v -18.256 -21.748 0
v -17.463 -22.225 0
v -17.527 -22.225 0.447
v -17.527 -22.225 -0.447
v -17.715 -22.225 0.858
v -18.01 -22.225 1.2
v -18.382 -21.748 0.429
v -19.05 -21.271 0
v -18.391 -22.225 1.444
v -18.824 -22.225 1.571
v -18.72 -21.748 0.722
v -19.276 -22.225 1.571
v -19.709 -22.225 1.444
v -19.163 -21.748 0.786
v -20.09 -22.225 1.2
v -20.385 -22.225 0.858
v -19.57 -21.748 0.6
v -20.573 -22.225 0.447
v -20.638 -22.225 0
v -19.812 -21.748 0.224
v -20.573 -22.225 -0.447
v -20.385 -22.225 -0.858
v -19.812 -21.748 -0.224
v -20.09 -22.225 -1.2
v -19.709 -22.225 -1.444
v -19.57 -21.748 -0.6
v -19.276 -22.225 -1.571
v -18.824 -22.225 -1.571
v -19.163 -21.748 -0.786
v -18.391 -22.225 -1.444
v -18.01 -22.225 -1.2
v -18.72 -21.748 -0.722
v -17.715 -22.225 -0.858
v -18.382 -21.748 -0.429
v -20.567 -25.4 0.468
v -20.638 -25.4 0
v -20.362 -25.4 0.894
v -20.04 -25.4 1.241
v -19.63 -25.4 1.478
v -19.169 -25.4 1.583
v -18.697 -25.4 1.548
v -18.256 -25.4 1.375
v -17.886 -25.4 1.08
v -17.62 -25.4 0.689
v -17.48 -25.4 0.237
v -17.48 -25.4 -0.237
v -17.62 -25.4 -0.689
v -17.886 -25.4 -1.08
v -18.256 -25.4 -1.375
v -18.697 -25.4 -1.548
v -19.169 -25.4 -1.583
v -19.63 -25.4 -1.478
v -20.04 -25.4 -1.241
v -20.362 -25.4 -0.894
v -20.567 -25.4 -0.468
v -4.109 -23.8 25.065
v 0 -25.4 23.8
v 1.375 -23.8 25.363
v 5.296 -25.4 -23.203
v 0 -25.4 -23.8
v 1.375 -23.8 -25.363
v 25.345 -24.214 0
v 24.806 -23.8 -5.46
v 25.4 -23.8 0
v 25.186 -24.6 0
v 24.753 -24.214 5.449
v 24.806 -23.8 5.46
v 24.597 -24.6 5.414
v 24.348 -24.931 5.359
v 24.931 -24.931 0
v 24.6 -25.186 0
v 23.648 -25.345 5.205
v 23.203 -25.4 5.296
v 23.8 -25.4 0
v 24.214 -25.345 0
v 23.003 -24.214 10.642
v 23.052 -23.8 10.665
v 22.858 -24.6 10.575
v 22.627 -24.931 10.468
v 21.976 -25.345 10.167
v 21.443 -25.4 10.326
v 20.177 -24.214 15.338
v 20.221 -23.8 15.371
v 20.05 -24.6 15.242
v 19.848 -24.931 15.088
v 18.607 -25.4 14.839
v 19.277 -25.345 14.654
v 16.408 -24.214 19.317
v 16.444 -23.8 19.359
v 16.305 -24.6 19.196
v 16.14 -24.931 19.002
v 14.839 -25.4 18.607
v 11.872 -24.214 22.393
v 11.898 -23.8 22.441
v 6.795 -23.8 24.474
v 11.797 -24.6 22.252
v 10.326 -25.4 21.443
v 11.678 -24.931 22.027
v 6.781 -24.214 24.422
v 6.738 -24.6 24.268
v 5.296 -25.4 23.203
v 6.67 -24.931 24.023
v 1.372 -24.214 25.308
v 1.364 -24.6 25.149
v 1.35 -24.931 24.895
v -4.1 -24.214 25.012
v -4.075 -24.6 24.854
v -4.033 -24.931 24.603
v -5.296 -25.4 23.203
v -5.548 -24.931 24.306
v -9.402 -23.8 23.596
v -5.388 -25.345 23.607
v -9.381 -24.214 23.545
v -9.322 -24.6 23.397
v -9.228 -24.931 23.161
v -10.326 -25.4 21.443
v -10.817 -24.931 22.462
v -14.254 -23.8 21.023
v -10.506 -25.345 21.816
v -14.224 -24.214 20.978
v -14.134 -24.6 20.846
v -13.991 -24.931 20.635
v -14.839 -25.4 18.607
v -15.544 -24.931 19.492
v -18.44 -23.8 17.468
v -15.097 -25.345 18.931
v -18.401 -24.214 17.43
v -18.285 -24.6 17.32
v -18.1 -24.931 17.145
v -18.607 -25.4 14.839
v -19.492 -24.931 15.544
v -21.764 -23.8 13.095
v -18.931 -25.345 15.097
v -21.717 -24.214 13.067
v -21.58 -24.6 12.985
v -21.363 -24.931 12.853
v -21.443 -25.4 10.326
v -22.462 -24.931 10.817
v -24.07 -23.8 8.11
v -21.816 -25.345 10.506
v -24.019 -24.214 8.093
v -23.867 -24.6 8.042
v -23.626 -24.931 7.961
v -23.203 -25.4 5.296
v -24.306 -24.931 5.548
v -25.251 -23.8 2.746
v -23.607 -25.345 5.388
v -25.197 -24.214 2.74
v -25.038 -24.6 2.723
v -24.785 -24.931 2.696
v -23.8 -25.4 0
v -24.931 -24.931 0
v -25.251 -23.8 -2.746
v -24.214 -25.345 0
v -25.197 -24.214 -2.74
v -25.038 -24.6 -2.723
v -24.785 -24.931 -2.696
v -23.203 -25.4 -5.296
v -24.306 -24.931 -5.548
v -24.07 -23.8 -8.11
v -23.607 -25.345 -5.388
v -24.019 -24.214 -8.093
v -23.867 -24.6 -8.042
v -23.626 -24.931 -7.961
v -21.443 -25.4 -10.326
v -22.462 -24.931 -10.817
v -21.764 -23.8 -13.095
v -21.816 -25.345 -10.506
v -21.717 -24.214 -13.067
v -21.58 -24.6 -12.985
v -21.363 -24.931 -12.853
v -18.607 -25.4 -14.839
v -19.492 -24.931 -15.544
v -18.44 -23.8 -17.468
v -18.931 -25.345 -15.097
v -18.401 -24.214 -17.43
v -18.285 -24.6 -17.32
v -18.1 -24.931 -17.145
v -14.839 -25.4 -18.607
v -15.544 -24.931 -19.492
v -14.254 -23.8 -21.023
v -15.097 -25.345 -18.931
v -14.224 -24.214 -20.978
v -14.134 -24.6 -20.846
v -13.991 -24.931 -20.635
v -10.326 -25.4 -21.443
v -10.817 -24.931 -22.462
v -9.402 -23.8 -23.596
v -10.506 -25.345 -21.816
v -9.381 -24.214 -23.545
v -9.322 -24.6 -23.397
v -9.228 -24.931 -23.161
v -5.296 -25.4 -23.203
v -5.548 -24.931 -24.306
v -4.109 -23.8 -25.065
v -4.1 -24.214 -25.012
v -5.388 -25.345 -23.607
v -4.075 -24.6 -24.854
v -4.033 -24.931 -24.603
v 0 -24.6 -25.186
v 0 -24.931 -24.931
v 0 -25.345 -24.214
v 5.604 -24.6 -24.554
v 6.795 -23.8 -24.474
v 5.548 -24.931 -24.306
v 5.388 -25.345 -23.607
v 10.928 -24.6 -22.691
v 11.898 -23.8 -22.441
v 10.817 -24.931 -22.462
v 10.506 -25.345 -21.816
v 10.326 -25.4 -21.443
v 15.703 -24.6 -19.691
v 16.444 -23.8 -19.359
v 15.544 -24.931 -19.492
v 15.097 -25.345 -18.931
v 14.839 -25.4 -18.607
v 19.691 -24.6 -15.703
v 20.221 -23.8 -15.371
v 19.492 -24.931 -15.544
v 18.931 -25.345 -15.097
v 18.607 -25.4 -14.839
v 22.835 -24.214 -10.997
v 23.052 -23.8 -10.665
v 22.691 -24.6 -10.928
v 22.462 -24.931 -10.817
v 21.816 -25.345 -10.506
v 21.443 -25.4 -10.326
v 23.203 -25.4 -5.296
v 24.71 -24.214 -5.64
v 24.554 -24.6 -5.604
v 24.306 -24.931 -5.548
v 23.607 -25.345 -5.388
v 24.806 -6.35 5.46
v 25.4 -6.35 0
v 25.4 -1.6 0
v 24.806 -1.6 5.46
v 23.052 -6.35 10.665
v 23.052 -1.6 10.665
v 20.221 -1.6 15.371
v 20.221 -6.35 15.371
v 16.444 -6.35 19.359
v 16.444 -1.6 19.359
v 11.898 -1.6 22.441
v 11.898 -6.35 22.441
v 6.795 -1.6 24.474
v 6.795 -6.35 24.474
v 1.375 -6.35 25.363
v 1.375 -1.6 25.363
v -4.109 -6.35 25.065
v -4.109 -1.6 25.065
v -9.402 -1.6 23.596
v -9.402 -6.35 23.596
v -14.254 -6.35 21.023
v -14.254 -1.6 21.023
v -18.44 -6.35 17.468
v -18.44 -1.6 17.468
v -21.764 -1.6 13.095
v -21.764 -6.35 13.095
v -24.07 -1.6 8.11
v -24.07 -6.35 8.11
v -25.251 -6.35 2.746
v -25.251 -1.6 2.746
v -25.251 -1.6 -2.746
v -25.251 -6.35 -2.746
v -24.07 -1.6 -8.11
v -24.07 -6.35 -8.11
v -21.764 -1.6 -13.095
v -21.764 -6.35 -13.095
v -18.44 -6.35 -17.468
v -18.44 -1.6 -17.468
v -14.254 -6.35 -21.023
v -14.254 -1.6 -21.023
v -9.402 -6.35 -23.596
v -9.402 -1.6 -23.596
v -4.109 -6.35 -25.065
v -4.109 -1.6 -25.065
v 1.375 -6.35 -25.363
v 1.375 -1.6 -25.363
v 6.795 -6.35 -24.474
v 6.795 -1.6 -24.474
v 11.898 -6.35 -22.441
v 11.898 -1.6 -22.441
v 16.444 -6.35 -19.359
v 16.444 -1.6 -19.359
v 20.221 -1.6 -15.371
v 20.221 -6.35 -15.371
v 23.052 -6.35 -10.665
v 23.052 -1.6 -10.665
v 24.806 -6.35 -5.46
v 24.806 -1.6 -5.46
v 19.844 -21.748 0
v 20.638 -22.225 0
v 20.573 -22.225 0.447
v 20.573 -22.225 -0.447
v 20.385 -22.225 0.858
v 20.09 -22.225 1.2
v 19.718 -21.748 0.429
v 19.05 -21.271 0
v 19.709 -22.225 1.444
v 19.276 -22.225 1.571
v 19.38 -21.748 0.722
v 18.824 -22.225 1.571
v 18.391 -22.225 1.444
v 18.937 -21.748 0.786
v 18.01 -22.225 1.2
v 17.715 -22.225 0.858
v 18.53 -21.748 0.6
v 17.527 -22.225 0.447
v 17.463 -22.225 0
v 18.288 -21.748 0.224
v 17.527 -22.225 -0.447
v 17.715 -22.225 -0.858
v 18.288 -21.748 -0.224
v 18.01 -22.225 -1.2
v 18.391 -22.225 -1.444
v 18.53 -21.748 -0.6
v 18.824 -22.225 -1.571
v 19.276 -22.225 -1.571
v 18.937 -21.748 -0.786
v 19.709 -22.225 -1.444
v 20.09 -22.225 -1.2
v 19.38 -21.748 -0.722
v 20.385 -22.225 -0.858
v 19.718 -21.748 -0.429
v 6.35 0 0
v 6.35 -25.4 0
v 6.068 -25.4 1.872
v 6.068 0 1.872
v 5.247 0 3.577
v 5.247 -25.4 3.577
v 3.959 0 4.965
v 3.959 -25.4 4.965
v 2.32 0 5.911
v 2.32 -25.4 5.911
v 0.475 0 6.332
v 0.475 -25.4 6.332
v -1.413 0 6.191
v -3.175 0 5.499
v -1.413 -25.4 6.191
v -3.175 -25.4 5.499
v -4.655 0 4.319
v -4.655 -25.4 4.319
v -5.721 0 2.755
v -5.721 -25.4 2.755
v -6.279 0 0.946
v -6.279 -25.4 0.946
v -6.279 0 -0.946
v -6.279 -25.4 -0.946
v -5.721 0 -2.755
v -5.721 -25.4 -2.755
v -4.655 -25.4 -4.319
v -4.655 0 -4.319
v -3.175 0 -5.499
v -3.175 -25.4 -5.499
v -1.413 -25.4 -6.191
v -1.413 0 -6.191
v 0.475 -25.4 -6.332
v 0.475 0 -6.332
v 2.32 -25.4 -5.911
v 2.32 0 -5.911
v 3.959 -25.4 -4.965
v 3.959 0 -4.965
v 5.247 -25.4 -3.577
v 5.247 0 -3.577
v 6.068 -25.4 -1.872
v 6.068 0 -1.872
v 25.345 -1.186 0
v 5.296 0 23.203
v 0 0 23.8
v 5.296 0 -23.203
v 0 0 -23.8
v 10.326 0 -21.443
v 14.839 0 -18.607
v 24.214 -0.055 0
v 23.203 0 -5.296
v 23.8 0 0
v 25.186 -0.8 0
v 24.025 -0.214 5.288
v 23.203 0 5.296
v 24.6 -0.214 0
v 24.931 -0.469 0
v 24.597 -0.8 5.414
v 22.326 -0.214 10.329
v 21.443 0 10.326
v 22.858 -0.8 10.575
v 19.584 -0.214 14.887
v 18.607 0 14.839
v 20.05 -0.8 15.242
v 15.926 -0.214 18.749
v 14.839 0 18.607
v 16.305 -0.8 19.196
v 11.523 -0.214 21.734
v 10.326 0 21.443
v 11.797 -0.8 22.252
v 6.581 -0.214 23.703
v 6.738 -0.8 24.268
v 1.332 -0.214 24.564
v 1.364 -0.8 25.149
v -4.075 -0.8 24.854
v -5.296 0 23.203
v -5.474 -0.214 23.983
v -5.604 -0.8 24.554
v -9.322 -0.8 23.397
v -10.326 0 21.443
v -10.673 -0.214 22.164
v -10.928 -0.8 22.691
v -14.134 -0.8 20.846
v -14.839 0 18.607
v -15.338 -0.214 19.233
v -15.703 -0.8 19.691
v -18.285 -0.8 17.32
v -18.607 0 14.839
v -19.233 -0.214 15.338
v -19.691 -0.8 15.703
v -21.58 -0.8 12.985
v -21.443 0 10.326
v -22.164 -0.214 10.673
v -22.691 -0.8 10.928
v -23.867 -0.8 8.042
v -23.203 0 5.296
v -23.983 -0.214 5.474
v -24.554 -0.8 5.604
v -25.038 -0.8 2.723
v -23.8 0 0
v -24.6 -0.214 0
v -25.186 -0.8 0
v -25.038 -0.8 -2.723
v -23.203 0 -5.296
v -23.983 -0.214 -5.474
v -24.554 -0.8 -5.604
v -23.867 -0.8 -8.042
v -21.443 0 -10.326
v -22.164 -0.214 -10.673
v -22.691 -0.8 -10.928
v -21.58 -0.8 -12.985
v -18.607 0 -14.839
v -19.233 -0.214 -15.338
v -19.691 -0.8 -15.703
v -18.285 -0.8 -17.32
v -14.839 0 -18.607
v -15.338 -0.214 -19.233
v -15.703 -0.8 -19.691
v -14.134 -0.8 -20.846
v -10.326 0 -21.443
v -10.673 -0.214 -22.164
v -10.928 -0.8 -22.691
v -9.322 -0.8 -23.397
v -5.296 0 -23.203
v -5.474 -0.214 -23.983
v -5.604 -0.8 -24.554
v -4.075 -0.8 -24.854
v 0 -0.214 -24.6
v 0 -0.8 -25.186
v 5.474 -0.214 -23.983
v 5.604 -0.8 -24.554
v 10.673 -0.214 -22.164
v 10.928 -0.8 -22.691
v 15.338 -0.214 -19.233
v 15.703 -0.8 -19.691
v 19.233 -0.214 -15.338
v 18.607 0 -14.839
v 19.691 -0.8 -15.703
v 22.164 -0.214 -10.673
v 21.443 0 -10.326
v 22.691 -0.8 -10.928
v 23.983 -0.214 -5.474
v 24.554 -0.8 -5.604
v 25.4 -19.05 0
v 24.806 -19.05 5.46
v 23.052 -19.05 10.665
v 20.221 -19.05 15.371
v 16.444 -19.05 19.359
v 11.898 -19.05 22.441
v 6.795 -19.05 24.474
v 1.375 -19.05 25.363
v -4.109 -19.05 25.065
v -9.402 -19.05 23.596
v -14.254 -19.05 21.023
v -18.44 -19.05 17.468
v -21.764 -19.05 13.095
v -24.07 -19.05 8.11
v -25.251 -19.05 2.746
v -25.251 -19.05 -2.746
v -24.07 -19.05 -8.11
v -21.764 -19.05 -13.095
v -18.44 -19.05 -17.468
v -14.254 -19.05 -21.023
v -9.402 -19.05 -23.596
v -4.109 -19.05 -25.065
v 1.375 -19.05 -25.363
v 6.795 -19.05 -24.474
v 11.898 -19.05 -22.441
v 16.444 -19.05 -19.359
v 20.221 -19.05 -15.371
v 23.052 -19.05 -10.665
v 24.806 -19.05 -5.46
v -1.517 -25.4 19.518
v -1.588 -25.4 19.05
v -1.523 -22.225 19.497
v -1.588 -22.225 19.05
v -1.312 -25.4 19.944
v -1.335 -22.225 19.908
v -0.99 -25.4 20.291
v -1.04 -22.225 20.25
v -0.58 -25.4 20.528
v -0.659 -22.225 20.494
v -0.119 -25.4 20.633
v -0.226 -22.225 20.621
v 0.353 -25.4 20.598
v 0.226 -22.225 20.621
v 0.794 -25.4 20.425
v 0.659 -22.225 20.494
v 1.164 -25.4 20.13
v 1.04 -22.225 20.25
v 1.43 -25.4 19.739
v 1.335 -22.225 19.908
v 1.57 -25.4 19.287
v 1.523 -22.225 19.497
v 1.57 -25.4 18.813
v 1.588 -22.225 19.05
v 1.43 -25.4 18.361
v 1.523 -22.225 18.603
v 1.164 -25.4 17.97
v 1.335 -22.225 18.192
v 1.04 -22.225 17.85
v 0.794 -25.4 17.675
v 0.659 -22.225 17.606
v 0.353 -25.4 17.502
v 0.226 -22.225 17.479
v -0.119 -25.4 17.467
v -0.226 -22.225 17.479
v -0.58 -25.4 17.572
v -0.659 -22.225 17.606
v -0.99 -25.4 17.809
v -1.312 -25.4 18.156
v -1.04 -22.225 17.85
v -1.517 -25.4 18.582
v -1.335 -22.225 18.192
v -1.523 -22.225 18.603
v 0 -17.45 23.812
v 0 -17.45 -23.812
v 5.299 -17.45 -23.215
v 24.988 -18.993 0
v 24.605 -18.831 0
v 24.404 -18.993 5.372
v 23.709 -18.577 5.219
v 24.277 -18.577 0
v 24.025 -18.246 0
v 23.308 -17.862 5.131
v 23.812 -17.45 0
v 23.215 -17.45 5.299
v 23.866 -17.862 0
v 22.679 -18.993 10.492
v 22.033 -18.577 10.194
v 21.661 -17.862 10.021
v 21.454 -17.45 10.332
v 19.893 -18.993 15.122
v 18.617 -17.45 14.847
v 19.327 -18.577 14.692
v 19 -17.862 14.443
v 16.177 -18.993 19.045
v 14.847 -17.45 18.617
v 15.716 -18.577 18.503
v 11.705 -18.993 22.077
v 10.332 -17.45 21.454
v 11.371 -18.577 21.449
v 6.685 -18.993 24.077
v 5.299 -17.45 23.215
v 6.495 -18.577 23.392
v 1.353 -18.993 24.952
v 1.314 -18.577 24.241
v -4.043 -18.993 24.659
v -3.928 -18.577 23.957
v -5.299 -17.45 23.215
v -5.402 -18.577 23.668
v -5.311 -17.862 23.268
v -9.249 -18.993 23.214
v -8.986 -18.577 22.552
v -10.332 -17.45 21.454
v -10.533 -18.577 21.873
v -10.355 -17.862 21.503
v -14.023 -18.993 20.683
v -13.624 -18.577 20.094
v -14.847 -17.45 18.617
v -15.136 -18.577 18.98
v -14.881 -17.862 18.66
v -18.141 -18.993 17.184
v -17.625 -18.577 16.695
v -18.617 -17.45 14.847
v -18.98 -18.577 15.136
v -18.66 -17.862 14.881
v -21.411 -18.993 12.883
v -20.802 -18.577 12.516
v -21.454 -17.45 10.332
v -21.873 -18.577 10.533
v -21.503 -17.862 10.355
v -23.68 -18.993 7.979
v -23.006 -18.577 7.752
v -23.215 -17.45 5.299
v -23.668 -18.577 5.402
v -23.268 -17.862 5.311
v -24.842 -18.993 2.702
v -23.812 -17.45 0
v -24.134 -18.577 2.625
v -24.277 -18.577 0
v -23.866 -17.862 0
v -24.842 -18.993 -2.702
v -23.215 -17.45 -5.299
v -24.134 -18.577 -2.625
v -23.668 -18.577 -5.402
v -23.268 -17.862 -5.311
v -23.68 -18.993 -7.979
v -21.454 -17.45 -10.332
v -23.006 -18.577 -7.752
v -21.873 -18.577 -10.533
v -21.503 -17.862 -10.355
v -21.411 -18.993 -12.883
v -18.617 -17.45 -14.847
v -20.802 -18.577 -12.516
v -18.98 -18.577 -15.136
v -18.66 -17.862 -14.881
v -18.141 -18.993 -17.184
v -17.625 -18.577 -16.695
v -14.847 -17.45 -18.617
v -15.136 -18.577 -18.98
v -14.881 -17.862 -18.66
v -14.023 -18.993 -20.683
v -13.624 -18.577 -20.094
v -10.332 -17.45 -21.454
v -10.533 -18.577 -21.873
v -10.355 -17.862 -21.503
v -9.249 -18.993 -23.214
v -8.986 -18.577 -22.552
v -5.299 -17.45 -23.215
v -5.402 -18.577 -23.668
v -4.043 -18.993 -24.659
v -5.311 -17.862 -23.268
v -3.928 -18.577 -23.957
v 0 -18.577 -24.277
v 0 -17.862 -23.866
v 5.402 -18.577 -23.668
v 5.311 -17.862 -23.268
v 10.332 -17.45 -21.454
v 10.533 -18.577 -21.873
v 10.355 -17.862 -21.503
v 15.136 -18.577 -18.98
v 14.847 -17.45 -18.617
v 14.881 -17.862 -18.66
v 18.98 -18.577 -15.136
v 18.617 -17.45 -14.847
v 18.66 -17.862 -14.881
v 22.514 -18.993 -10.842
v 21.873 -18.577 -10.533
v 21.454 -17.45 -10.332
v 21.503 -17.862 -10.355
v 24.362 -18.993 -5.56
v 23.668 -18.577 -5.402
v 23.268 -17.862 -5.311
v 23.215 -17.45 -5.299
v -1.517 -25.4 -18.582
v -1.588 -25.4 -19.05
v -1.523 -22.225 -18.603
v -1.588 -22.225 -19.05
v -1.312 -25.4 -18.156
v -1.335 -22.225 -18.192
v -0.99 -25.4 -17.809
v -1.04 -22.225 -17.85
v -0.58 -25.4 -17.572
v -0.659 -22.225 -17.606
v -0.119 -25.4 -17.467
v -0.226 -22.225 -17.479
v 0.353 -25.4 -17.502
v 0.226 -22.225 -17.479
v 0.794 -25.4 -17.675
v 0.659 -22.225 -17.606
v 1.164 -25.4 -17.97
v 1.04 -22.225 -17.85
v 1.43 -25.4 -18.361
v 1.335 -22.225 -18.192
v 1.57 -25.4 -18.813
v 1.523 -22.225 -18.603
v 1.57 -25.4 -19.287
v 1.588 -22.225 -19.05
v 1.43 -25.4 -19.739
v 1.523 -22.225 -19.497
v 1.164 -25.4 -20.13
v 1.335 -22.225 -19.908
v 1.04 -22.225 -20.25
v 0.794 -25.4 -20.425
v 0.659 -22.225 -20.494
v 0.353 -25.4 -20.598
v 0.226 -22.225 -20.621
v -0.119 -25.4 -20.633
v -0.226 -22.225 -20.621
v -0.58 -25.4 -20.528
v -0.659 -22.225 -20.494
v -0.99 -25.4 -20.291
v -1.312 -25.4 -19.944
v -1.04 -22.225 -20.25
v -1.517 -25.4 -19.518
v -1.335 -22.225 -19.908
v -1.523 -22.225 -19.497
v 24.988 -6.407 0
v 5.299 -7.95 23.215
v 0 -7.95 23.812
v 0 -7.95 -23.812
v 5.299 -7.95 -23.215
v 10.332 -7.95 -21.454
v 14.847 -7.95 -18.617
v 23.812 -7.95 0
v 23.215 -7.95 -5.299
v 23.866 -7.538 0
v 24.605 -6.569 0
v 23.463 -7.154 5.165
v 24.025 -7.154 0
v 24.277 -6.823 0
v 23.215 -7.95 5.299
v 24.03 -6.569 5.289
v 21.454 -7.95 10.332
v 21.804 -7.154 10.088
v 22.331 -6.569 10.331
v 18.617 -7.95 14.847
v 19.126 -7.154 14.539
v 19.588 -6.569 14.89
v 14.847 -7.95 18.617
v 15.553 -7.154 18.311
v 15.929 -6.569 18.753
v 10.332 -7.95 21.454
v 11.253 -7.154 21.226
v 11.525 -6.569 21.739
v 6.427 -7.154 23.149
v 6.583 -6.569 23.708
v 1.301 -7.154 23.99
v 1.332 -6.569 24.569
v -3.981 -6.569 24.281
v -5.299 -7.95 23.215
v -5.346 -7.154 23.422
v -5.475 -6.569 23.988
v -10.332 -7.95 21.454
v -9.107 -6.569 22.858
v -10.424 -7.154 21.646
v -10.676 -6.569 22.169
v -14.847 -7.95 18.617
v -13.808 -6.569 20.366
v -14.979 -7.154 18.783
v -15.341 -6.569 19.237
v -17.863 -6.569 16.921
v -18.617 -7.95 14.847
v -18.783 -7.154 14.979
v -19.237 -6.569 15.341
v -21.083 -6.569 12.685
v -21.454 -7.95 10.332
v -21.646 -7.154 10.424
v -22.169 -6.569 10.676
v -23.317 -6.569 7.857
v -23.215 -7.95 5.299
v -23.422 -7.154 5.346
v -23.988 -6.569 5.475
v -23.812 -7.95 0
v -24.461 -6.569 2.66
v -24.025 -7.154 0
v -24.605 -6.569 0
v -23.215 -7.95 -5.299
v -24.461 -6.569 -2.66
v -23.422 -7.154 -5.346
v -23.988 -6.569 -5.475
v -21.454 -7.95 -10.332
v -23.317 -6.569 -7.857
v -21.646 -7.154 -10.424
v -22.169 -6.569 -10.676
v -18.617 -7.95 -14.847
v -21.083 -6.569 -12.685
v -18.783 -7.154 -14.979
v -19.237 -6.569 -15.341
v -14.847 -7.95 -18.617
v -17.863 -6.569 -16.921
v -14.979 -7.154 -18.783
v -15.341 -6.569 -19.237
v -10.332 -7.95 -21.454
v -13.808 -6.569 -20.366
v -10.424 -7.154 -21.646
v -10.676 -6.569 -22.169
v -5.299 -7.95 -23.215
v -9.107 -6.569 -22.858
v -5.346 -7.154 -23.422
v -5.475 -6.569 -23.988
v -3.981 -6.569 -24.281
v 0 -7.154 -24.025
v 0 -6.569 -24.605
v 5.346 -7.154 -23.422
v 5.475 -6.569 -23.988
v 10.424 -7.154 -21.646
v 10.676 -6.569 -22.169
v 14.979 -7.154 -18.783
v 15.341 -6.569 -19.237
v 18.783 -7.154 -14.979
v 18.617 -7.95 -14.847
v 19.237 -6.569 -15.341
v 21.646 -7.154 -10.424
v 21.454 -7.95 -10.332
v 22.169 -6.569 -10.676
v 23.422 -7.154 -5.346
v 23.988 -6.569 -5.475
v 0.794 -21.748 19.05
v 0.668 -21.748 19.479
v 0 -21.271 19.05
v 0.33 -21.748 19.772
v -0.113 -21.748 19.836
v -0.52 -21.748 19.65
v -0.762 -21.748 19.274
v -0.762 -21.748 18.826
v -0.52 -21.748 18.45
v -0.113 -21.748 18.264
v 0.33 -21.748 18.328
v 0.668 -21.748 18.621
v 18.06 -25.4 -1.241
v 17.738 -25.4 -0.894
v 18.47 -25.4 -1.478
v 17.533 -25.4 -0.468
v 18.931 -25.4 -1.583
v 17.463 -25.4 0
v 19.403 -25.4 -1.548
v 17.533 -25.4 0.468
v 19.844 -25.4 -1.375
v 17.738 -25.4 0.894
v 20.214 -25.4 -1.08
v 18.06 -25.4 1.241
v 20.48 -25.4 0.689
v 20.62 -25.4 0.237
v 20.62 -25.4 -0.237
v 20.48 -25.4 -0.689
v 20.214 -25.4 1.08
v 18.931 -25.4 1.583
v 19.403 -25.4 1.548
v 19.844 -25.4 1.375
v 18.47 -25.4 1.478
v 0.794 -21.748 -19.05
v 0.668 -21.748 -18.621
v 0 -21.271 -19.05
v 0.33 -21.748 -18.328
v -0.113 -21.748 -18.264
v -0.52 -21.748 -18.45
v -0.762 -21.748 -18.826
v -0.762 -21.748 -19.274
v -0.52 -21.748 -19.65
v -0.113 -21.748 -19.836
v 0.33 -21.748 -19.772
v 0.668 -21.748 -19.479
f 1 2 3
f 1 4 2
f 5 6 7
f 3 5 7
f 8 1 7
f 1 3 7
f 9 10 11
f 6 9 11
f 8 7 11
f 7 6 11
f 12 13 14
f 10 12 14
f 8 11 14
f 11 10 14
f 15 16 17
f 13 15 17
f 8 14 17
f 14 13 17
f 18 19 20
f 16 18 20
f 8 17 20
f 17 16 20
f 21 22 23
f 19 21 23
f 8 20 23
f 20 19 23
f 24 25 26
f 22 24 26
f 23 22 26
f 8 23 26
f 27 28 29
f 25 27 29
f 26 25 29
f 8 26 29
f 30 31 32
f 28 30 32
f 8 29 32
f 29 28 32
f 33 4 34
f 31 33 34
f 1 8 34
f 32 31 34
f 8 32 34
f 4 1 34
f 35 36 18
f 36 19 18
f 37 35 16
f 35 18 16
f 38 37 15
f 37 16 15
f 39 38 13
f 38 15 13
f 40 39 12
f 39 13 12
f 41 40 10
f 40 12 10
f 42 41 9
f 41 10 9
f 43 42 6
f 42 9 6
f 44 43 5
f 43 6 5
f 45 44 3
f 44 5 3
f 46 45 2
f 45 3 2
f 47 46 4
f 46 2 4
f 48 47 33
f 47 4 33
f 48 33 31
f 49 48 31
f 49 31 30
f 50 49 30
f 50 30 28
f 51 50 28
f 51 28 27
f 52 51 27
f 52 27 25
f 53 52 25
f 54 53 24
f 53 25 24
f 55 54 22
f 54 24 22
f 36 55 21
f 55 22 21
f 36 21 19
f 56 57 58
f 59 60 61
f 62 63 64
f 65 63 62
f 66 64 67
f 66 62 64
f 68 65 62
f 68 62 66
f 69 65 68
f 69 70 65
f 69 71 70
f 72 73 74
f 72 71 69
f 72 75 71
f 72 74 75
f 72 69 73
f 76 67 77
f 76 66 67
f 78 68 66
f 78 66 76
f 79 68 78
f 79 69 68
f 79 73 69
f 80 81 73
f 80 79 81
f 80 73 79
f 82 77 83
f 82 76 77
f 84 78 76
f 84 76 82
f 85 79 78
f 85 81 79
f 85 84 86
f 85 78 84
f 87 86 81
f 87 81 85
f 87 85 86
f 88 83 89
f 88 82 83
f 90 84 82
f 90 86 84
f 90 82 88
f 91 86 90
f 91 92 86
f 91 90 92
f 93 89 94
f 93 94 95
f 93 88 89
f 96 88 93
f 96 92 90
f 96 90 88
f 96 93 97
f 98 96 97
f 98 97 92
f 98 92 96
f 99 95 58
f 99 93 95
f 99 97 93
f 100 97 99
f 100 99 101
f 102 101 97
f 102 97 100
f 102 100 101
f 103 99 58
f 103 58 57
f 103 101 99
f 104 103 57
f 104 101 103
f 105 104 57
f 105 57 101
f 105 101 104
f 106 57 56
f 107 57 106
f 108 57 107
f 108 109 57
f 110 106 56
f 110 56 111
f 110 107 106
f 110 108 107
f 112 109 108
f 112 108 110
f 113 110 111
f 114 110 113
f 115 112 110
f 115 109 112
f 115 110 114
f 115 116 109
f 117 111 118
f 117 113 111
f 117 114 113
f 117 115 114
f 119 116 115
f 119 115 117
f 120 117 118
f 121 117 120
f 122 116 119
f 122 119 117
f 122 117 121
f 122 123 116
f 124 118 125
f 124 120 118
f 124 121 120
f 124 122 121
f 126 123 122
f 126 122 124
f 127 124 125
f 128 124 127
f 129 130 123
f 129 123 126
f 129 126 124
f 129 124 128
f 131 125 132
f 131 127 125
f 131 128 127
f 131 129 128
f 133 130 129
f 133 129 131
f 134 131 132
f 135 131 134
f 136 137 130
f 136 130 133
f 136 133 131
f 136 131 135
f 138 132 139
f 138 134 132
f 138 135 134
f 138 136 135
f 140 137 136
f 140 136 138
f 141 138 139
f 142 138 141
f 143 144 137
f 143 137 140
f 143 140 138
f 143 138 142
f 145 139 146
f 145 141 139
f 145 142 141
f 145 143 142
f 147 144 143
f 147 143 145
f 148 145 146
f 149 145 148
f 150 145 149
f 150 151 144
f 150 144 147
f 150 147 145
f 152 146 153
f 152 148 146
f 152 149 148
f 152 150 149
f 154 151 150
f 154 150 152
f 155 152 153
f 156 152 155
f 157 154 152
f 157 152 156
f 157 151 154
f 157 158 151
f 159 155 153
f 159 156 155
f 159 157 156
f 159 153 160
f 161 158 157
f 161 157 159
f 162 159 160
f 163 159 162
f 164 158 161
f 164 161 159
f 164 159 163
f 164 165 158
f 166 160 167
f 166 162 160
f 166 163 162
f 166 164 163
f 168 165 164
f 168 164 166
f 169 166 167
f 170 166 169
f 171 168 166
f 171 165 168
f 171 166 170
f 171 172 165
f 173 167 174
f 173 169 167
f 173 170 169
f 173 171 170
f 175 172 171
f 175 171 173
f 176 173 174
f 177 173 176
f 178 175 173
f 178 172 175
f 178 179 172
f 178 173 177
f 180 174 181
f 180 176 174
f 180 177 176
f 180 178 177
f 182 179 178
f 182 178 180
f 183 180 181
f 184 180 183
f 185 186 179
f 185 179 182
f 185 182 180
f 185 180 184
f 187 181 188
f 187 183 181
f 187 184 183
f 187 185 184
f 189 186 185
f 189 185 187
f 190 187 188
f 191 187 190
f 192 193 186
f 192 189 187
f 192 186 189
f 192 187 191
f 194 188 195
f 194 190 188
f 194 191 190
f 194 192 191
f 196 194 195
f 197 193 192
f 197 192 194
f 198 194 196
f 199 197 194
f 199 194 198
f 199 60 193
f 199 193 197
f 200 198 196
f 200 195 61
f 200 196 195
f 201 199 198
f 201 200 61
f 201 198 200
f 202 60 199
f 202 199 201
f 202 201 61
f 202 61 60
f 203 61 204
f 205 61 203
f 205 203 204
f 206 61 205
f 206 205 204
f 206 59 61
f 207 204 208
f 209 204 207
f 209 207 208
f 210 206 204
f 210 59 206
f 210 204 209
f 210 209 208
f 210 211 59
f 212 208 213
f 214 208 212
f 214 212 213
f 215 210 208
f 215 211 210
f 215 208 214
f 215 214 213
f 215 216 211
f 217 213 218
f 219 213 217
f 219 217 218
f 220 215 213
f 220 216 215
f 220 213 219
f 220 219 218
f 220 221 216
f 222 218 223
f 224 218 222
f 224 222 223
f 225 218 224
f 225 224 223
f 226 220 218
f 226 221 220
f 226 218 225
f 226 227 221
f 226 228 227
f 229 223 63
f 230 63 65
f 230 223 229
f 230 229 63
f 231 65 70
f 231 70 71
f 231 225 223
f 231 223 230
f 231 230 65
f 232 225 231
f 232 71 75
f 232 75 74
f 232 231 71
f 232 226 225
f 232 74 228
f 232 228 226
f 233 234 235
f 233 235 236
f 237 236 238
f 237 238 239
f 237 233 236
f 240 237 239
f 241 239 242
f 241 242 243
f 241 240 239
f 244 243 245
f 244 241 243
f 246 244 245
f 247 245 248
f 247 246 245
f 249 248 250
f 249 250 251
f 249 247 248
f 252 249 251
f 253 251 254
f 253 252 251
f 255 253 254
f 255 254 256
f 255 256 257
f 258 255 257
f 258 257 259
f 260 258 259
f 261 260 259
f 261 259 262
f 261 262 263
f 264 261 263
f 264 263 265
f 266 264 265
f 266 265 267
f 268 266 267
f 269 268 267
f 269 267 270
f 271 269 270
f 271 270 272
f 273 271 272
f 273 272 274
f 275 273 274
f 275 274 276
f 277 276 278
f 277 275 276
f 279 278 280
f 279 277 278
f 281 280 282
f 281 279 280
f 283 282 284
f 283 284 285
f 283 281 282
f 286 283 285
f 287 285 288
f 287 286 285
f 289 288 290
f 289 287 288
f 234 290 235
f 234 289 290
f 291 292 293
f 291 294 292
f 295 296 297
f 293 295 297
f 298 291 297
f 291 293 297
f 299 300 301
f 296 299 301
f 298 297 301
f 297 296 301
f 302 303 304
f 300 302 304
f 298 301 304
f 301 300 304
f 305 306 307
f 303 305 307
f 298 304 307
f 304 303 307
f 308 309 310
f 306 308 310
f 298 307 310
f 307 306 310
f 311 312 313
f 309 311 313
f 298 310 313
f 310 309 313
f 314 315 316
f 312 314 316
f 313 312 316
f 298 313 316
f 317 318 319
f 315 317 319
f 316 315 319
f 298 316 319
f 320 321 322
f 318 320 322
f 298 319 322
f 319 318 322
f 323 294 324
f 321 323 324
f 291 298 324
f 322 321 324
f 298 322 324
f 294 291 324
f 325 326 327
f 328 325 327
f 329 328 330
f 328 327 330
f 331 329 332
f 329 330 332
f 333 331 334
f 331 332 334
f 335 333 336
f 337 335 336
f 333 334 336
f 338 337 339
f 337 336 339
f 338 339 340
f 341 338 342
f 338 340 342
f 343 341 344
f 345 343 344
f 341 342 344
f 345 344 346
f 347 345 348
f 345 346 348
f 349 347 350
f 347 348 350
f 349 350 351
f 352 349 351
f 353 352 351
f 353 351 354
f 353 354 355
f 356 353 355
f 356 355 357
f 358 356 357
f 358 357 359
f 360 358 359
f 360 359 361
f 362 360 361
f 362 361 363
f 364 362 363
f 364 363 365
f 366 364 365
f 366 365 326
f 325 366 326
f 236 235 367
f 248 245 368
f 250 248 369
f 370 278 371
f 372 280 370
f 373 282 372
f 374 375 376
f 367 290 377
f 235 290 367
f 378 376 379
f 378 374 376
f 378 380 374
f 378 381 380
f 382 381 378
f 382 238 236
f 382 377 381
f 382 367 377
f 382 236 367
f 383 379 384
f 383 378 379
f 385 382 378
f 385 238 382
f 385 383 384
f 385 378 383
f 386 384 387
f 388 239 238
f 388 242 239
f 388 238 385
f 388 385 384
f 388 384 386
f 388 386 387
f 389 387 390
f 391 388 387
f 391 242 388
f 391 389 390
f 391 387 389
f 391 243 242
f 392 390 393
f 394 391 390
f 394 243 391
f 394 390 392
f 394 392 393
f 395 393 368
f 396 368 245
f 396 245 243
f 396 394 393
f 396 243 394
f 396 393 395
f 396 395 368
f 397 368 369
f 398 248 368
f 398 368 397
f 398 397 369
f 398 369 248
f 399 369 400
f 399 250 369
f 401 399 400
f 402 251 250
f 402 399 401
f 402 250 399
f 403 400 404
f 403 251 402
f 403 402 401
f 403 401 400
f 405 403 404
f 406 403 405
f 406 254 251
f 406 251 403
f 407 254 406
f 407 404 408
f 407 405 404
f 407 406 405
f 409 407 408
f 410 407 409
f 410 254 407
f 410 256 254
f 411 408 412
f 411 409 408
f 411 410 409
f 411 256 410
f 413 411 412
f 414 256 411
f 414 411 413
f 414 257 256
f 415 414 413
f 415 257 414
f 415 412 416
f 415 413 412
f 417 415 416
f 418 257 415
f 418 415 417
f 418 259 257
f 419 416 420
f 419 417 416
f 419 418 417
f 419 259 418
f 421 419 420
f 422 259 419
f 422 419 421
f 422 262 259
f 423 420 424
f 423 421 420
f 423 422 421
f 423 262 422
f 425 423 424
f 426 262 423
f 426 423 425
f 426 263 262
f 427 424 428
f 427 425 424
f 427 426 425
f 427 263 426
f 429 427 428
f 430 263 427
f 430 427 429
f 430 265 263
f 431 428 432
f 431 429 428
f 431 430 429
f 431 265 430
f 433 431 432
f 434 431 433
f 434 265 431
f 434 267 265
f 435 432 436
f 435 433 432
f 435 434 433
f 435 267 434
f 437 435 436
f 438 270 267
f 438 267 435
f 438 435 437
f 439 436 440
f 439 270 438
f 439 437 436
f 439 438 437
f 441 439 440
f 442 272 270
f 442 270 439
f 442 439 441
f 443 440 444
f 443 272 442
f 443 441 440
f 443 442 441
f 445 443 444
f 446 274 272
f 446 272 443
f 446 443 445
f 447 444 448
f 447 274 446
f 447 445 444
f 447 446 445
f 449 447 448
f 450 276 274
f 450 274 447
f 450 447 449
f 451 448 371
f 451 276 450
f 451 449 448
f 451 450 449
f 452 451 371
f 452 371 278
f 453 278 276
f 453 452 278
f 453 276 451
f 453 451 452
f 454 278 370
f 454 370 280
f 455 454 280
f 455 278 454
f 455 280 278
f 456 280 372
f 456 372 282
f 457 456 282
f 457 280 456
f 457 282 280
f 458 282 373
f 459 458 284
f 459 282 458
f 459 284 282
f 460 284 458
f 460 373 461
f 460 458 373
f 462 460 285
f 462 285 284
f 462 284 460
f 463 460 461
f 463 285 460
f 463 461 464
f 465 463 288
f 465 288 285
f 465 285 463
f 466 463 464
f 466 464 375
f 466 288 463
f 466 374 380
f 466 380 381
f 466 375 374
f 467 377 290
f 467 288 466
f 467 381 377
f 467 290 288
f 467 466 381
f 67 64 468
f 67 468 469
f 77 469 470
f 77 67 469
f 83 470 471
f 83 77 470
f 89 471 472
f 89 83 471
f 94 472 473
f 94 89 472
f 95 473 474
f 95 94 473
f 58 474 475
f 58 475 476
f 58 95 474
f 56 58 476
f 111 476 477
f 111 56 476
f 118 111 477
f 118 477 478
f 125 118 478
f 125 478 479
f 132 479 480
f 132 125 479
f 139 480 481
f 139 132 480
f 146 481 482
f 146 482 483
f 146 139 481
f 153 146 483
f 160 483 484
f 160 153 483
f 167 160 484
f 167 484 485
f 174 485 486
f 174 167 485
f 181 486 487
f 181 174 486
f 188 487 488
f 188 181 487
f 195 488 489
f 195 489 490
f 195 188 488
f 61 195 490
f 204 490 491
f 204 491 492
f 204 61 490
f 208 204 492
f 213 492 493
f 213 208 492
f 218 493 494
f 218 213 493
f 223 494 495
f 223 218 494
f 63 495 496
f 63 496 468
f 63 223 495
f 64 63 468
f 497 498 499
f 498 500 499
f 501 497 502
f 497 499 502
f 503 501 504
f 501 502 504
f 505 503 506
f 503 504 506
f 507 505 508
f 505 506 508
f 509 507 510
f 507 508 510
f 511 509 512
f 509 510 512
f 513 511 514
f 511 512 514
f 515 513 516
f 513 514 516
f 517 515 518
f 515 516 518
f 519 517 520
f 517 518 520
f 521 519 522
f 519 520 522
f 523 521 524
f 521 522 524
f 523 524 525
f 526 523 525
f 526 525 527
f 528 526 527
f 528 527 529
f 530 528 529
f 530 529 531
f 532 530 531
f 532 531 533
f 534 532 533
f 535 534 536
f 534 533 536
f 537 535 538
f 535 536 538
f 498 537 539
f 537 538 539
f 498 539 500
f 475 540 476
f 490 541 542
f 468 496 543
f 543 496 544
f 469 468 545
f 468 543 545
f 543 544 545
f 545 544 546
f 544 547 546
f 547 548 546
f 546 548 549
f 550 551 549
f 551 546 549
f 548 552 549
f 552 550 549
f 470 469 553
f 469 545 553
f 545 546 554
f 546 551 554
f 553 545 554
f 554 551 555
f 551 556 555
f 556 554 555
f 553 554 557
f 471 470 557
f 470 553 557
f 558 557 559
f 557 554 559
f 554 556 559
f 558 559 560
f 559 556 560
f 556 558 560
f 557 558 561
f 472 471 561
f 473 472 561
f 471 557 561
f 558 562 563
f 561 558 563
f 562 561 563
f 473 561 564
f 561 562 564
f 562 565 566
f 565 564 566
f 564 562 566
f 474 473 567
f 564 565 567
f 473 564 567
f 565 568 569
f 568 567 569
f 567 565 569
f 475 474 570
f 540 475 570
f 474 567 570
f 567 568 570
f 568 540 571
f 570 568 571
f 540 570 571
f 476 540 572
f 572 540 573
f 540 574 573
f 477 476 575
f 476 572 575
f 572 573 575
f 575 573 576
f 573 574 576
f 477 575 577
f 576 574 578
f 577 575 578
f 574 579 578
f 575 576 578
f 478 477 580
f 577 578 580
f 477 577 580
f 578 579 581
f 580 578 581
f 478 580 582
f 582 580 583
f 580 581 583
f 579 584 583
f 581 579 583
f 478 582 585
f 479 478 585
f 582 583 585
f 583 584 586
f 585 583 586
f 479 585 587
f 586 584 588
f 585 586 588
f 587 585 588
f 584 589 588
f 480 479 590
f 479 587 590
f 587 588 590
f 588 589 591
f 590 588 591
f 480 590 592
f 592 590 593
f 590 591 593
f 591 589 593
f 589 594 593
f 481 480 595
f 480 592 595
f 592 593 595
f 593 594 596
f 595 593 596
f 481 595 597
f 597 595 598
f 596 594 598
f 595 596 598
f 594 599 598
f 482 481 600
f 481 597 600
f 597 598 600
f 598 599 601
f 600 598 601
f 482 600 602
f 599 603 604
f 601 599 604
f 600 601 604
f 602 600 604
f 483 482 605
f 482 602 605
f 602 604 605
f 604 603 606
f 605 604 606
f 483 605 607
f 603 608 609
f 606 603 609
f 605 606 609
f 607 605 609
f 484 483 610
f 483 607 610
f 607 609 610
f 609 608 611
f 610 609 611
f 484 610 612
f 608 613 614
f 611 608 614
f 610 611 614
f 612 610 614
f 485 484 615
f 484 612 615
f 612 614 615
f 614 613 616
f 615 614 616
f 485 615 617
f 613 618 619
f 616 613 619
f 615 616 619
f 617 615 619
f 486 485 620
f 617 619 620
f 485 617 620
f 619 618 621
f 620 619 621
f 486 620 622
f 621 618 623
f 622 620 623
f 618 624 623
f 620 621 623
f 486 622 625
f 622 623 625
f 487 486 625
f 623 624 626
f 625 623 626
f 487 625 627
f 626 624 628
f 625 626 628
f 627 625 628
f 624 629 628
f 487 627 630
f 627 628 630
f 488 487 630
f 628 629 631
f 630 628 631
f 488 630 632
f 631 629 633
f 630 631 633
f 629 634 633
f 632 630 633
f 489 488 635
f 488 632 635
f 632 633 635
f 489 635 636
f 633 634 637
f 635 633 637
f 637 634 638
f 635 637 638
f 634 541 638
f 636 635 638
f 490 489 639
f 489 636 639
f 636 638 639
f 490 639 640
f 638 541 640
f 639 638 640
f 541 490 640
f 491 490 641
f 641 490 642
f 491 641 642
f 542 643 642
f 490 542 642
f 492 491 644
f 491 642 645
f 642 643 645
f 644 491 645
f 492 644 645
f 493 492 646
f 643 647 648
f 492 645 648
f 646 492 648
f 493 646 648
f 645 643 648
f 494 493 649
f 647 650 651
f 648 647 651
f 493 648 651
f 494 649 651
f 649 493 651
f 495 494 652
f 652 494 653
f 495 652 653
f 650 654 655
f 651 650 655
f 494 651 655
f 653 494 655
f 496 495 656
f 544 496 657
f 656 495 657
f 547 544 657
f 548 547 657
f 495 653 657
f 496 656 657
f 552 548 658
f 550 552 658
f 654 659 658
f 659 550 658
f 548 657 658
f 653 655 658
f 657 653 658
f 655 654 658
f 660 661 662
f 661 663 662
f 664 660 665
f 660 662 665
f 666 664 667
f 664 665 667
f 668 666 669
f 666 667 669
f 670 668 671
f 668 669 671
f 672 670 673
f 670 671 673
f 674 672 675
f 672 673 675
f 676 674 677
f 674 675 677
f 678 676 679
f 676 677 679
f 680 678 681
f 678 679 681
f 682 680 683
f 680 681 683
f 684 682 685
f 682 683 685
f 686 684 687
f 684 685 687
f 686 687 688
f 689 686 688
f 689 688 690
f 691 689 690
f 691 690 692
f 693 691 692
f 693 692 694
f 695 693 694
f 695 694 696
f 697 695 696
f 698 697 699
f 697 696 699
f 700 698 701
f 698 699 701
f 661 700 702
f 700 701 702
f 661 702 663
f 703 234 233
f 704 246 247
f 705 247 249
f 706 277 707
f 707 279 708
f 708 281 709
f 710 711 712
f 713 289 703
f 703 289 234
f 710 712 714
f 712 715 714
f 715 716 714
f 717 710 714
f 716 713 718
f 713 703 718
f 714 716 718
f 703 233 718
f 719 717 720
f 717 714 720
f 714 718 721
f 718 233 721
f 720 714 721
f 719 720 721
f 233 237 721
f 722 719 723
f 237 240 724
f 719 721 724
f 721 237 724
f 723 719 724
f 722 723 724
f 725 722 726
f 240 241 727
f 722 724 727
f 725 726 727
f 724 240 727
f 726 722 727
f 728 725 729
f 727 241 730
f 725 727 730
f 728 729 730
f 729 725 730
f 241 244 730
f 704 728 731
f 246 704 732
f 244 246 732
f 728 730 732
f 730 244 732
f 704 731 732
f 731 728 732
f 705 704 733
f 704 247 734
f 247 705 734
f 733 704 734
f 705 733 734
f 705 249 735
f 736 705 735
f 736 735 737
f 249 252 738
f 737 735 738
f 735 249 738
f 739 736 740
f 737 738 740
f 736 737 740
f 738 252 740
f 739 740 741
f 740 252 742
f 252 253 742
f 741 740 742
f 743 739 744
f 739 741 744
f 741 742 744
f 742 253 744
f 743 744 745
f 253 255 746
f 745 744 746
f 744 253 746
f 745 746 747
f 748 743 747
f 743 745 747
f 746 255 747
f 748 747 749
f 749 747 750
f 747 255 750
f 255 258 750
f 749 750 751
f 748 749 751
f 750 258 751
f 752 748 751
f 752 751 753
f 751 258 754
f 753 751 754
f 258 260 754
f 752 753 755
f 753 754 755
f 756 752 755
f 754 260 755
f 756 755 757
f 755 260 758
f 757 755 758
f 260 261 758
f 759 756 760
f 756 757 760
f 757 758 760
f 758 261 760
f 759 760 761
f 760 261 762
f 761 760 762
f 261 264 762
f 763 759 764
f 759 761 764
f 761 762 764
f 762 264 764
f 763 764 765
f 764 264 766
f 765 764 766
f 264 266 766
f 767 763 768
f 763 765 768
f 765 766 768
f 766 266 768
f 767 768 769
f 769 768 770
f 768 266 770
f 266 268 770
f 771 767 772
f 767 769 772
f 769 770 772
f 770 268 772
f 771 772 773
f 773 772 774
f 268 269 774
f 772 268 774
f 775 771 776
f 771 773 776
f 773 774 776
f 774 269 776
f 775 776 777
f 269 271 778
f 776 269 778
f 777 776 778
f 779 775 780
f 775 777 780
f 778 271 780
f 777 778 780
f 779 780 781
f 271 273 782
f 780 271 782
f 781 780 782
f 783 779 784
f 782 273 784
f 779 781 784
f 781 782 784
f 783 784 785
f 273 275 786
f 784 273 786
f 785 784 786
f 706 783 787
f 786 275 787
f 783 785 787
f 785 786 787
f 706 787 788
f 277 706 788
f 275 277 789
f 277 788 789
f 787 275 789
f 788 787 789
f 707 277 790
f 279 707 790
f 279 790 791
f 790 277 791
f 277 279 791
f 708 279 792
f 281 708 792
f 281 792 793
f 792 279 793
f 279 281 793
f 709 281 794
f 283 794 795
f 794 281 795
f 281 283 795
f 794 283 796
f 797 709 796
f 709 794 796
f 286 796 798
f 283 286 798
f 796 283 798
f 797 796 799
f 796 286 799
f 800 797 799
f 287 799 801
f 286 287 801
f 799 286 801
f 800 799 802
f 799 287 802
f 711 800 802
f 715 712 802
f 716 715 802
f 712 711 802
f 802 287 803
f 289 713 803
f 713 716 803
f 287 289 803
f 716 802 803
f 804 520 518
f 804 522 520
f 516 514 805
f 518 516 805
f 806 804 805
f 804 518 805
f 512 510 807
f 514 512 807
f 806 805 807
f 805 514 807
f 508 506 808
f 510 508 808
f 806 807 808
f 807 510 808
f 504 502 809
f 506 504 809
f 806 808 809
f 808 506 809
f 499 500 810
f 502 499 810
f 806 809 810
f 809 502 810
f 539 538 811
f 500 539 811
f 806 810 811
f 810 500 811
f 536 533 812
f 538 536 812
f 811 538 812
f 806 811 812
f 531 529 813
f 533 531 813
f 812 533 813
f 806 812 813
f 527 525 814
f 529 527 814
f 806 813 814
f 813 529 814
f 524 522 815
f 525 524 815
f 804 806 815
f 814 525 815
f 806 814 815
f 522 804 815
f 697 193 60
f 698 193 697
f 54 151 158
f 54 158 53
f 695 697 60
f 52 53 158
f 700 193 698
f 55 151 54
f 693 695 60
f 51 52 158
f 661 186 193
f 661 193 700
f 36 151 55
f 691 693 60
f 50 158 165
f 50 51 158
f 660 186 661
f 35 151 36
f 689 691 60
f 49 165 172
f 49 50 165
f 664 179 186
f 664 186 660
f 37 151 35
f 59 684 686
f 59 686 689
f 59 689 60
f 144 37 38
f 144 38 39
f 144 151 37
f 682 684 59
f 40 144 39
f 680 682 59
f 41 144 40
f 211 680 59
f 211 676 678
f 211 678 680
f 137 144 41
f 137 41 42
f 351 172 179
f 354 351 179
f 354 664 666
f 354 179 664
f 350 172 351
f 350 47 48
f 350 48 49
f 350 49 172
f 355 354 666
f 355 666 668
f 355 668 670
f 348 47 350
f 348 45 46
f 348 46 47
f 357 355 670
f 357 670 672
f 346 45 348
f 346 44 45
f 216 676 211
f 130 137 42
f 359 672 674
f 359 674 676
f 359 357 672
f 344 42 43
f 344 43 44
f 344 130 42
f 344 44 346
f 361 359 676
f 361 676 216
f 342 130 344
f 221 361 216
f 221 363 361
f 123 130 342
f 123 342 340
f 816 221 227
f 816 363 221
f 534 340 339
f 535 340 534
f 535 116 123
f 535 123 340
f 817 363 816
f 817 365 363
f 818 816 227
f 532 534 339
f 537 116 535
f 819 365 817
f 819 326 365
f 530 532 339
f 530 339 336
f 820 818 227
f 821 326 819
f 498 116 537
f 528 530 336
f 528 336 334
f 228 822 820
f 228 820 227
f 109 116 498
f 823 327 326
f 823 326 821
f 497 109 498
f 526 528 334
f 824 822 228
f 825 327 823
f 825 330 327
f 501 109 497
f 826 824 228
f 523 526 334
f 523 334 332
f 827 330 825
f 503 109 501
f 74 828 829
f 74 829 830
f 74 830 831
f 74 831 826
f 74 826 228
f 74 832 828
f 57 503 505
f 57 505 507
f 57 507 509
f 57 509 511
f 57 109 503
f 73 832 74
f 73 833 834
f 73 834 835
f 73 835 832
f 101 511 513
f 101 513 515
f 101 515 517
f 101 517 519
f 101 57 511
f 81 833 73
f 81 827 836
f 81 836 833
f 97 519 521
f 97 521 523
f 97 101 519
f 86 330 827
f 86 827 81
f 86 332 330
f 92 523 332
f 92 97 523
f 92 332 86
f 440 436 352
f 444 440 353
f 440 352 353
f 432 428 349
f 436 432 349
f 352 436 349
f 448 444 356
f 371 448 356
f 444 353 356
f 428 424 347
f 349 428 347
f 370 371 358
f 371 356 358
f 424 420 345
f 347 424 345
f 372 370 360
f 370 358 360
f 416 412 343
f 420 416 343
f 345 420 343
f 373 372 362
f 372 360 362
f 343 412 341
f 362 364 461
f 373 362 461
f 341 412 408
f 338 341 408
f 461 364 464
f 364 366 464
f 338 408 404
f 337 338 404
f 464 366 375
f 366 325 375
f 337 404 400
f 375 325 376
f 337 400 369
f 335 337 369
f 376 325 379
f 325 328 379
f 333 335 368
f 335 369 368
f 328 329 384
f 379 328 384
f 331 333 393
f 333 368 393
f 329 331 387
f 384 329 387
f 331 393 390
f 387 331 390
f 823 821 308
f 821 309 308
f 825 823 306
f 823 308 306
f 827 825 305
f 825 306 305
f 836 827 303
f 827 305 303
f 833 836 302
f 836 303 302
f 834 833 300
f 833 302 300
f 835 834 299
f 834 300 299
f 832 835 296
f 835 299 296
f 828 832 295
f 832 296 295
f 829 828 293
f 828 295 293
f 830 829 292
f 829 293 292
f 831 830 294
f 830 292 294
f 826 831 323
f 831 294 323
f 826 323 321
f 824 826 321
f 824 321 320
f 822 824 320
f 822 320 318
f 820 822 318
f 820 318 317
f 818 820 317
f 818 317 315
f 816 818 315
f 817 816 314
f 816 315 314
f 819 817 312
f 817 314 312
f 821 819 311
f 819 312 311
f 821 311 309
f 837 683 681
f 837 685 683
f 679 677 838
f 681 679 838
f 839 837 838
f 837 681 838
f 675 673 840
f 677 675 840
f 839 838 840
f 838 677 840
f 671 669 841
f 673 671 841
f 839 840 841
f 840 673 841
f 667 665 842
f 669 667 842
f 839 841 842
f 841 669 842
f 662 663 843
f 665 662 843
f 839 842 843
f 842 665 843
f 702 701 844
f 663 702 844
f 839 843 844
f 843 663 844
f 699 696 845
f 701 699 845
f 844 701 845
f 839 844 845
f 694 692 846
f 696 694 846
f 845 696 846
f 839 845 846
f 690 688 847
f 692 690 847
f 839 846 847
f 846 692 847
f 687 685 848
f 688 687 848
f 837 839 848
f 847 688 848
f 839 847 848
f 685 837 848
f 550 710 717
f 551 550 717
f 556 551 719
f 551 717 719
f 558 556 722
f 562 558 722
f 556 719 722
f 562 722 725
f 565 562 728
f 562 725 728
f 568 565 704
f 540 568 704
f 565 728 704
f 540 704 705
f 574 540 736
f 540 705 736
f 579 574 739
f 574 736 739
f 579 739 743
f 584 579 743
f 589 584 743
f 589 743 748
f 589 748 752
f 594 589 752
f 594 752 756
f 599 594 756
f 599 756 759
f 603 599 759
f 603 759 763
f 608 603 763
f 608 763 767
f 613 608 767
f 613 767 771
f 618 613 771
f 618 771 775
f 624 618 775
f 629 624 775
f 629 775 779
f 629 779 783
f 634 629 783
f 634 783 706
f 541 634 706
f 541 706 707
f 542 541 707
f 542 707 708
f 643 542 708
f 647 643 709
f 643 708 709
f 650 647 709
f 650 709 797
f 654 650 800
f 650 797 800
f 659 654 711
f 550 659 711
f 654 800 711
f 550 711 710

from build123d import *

# Parameters (mm, degrees)
F0_R          = 25.4
F1_DEPTH      = 6.35
F2_R          = 23.8125
F3_DEPTH      = 12.7
F4_R          = 25.4
F5_DEPTH      = 6.35
F6_R          = 6.35
F7_DEPTH      = 25.401
F9_D          = 3.175
F9_DEPTH      = 3.175
F9_TIP        = 0.9538662327
F10_S5_R      = 25.4
F10_T6_DEPTH  = 42
F10_S11_R     = 25.4
F10_T12_DEPTH = 40


# Not quite as in the source:
# - a fillet or chamfer that OpenCascade refuses, or shapes differently, is made with other operations: its cross-section is extruded or revolved along the edge and cut away or added


with BuildPart() as f1:
    # F0 (on Front) → F1 (new body)
    with BuildSketch(Plane.XZ):
        Circle(F0_R)
    extrude(amount=F1_DEPTH)

    # F2 (on face) → F3 (join)
    with BuildSketch(Plane.XZ.offset(6.35)):
        Circle(F2_R)
    extrude(amount=F3_DEPTH)

    # F4 (on face) → F5 (join)
    with BuildSketch(Plane.XZ.offset(19.05)):
        Circle(F4_R)
    extrude(amount=F5_DEPTH)

    # F6 (on face) → F7 (cut, through all)
    with BuildSketch(Plane.XZ.offset(25.4)):
        Circle(F6_R)
    extrude(amount=-F7_DEPTH, mode=Mode.SUBTRACT)

    # F9
    with Locations(Plane.XZ.offset(25.4)):
        with Locations((0, 19.05), (0, -19.05), (-19.05, 0), (19.05, 0)):
            Hole(F9_D / 2, depth=F9_DEPTH)
            with Locations((0, 0, -(F9_DEPTH + F9_TIP / 2))):  # 118° drill point
                Cone(0, F9_D / 2, F9_TIP, mode=Mode.SUBTRACT)

    # F10: fillet of radius 1.6002 on 5 edges, made by hand


with BuildPart() as f10_tool2:
    # F10_s3 → F10_t4 (revolve)
    with BuildSketch(Plane.XY):
        with BuildLine():
            ThreePointArc((23.8125, -7.9502), (24.2811877287, -6.8186877287), (25.4127, -6.35))
            Line((25.4127, -6.35), (23.8125, -6.35))
            Line((23.8125, -6.35), (23.8125, -7.9502))
        make_face()
    revolve(axis=Axis((0, -6.35, 0), (0, -1, 0)))

    # F10_s5 → F10_t6 (intersect, symmetric)
    with BuildSketch(Plane.XZ.offset(7.2)):
        Circle(F10_S5_R)
    extrude(amount=F10_T6_DEPTH, both=True, mode=Mode.INTERSECT)


with BuildPart() as f1_1:
    add(f1.part)

    # F10_t1: union F10_tool2
    add(f10_tool2.part)


with BuildPart() as f10_tool8:
    # F10_s9 → F10_t10 (revolve)
    with BuildSketch(Plane.XY):
        with BuildLine():
            ThreePointArc((25.4127, -19.05), (24.2811877287, -18.5813122713), (23.8125, -17.4498))
            Line((23.8125, -17.4498), (23.8125, -19.05))
            Line((23.8125, -19.05), (25.4127, -19.05))
        make_face()
    revolve(axis=Axis((0, -19.05, 0), (0, -1, 0)))

    # F10_s11 → F10_t12 (intersect, symmetric)
    with BuildSketch(Plane.XZ.offset(17.7)):
        Circle(F10_S11_R)
    extrude(amount=F10_T12_DEPTH, both=True, mode=Mode.INTERSECT)


with BuildPart() as f1_2:
    add(f1_1.part)

    # F10_t7: union F10_tool8
    add(f10_tool8.part)

    # F10_s13 → F10_t14 (revolve, cut)
    with BuildSketch(Plane.XY):
        with BuildLine():
            ThreePointArc((25.4, -23.7998), (24.9313122713, -24.9313122713), (23.7998, -25.4))
            Line((23.7998, -25.4), (25.4, -25.4))
            Line((25.4, -25.4), (25.4, -23.7998))
        make_face()
    revolve(axis=Axis((0, -25.4, 0), (0, -1, 0)), mode=Mode.SUBTRACT)

    # F10_s15 → F10_t16 (revolve, cut)
    with BuildSketch(Plane.XY):
        with BuildLine():
            ThreePointArc((23.7998, 0), (24.9313122713, -0.4686877287), (25.4, -1.6002))
            Line((25.4, -1.6002), (25.4, 0))
            Line((25.4, 0), (23.7998, 0))
        make_face()
    revolve(axis=Axis((0, 0, 0), (0, -1, 0)), mode=Mode.SUBTRACT)


solid = f1_2.part
